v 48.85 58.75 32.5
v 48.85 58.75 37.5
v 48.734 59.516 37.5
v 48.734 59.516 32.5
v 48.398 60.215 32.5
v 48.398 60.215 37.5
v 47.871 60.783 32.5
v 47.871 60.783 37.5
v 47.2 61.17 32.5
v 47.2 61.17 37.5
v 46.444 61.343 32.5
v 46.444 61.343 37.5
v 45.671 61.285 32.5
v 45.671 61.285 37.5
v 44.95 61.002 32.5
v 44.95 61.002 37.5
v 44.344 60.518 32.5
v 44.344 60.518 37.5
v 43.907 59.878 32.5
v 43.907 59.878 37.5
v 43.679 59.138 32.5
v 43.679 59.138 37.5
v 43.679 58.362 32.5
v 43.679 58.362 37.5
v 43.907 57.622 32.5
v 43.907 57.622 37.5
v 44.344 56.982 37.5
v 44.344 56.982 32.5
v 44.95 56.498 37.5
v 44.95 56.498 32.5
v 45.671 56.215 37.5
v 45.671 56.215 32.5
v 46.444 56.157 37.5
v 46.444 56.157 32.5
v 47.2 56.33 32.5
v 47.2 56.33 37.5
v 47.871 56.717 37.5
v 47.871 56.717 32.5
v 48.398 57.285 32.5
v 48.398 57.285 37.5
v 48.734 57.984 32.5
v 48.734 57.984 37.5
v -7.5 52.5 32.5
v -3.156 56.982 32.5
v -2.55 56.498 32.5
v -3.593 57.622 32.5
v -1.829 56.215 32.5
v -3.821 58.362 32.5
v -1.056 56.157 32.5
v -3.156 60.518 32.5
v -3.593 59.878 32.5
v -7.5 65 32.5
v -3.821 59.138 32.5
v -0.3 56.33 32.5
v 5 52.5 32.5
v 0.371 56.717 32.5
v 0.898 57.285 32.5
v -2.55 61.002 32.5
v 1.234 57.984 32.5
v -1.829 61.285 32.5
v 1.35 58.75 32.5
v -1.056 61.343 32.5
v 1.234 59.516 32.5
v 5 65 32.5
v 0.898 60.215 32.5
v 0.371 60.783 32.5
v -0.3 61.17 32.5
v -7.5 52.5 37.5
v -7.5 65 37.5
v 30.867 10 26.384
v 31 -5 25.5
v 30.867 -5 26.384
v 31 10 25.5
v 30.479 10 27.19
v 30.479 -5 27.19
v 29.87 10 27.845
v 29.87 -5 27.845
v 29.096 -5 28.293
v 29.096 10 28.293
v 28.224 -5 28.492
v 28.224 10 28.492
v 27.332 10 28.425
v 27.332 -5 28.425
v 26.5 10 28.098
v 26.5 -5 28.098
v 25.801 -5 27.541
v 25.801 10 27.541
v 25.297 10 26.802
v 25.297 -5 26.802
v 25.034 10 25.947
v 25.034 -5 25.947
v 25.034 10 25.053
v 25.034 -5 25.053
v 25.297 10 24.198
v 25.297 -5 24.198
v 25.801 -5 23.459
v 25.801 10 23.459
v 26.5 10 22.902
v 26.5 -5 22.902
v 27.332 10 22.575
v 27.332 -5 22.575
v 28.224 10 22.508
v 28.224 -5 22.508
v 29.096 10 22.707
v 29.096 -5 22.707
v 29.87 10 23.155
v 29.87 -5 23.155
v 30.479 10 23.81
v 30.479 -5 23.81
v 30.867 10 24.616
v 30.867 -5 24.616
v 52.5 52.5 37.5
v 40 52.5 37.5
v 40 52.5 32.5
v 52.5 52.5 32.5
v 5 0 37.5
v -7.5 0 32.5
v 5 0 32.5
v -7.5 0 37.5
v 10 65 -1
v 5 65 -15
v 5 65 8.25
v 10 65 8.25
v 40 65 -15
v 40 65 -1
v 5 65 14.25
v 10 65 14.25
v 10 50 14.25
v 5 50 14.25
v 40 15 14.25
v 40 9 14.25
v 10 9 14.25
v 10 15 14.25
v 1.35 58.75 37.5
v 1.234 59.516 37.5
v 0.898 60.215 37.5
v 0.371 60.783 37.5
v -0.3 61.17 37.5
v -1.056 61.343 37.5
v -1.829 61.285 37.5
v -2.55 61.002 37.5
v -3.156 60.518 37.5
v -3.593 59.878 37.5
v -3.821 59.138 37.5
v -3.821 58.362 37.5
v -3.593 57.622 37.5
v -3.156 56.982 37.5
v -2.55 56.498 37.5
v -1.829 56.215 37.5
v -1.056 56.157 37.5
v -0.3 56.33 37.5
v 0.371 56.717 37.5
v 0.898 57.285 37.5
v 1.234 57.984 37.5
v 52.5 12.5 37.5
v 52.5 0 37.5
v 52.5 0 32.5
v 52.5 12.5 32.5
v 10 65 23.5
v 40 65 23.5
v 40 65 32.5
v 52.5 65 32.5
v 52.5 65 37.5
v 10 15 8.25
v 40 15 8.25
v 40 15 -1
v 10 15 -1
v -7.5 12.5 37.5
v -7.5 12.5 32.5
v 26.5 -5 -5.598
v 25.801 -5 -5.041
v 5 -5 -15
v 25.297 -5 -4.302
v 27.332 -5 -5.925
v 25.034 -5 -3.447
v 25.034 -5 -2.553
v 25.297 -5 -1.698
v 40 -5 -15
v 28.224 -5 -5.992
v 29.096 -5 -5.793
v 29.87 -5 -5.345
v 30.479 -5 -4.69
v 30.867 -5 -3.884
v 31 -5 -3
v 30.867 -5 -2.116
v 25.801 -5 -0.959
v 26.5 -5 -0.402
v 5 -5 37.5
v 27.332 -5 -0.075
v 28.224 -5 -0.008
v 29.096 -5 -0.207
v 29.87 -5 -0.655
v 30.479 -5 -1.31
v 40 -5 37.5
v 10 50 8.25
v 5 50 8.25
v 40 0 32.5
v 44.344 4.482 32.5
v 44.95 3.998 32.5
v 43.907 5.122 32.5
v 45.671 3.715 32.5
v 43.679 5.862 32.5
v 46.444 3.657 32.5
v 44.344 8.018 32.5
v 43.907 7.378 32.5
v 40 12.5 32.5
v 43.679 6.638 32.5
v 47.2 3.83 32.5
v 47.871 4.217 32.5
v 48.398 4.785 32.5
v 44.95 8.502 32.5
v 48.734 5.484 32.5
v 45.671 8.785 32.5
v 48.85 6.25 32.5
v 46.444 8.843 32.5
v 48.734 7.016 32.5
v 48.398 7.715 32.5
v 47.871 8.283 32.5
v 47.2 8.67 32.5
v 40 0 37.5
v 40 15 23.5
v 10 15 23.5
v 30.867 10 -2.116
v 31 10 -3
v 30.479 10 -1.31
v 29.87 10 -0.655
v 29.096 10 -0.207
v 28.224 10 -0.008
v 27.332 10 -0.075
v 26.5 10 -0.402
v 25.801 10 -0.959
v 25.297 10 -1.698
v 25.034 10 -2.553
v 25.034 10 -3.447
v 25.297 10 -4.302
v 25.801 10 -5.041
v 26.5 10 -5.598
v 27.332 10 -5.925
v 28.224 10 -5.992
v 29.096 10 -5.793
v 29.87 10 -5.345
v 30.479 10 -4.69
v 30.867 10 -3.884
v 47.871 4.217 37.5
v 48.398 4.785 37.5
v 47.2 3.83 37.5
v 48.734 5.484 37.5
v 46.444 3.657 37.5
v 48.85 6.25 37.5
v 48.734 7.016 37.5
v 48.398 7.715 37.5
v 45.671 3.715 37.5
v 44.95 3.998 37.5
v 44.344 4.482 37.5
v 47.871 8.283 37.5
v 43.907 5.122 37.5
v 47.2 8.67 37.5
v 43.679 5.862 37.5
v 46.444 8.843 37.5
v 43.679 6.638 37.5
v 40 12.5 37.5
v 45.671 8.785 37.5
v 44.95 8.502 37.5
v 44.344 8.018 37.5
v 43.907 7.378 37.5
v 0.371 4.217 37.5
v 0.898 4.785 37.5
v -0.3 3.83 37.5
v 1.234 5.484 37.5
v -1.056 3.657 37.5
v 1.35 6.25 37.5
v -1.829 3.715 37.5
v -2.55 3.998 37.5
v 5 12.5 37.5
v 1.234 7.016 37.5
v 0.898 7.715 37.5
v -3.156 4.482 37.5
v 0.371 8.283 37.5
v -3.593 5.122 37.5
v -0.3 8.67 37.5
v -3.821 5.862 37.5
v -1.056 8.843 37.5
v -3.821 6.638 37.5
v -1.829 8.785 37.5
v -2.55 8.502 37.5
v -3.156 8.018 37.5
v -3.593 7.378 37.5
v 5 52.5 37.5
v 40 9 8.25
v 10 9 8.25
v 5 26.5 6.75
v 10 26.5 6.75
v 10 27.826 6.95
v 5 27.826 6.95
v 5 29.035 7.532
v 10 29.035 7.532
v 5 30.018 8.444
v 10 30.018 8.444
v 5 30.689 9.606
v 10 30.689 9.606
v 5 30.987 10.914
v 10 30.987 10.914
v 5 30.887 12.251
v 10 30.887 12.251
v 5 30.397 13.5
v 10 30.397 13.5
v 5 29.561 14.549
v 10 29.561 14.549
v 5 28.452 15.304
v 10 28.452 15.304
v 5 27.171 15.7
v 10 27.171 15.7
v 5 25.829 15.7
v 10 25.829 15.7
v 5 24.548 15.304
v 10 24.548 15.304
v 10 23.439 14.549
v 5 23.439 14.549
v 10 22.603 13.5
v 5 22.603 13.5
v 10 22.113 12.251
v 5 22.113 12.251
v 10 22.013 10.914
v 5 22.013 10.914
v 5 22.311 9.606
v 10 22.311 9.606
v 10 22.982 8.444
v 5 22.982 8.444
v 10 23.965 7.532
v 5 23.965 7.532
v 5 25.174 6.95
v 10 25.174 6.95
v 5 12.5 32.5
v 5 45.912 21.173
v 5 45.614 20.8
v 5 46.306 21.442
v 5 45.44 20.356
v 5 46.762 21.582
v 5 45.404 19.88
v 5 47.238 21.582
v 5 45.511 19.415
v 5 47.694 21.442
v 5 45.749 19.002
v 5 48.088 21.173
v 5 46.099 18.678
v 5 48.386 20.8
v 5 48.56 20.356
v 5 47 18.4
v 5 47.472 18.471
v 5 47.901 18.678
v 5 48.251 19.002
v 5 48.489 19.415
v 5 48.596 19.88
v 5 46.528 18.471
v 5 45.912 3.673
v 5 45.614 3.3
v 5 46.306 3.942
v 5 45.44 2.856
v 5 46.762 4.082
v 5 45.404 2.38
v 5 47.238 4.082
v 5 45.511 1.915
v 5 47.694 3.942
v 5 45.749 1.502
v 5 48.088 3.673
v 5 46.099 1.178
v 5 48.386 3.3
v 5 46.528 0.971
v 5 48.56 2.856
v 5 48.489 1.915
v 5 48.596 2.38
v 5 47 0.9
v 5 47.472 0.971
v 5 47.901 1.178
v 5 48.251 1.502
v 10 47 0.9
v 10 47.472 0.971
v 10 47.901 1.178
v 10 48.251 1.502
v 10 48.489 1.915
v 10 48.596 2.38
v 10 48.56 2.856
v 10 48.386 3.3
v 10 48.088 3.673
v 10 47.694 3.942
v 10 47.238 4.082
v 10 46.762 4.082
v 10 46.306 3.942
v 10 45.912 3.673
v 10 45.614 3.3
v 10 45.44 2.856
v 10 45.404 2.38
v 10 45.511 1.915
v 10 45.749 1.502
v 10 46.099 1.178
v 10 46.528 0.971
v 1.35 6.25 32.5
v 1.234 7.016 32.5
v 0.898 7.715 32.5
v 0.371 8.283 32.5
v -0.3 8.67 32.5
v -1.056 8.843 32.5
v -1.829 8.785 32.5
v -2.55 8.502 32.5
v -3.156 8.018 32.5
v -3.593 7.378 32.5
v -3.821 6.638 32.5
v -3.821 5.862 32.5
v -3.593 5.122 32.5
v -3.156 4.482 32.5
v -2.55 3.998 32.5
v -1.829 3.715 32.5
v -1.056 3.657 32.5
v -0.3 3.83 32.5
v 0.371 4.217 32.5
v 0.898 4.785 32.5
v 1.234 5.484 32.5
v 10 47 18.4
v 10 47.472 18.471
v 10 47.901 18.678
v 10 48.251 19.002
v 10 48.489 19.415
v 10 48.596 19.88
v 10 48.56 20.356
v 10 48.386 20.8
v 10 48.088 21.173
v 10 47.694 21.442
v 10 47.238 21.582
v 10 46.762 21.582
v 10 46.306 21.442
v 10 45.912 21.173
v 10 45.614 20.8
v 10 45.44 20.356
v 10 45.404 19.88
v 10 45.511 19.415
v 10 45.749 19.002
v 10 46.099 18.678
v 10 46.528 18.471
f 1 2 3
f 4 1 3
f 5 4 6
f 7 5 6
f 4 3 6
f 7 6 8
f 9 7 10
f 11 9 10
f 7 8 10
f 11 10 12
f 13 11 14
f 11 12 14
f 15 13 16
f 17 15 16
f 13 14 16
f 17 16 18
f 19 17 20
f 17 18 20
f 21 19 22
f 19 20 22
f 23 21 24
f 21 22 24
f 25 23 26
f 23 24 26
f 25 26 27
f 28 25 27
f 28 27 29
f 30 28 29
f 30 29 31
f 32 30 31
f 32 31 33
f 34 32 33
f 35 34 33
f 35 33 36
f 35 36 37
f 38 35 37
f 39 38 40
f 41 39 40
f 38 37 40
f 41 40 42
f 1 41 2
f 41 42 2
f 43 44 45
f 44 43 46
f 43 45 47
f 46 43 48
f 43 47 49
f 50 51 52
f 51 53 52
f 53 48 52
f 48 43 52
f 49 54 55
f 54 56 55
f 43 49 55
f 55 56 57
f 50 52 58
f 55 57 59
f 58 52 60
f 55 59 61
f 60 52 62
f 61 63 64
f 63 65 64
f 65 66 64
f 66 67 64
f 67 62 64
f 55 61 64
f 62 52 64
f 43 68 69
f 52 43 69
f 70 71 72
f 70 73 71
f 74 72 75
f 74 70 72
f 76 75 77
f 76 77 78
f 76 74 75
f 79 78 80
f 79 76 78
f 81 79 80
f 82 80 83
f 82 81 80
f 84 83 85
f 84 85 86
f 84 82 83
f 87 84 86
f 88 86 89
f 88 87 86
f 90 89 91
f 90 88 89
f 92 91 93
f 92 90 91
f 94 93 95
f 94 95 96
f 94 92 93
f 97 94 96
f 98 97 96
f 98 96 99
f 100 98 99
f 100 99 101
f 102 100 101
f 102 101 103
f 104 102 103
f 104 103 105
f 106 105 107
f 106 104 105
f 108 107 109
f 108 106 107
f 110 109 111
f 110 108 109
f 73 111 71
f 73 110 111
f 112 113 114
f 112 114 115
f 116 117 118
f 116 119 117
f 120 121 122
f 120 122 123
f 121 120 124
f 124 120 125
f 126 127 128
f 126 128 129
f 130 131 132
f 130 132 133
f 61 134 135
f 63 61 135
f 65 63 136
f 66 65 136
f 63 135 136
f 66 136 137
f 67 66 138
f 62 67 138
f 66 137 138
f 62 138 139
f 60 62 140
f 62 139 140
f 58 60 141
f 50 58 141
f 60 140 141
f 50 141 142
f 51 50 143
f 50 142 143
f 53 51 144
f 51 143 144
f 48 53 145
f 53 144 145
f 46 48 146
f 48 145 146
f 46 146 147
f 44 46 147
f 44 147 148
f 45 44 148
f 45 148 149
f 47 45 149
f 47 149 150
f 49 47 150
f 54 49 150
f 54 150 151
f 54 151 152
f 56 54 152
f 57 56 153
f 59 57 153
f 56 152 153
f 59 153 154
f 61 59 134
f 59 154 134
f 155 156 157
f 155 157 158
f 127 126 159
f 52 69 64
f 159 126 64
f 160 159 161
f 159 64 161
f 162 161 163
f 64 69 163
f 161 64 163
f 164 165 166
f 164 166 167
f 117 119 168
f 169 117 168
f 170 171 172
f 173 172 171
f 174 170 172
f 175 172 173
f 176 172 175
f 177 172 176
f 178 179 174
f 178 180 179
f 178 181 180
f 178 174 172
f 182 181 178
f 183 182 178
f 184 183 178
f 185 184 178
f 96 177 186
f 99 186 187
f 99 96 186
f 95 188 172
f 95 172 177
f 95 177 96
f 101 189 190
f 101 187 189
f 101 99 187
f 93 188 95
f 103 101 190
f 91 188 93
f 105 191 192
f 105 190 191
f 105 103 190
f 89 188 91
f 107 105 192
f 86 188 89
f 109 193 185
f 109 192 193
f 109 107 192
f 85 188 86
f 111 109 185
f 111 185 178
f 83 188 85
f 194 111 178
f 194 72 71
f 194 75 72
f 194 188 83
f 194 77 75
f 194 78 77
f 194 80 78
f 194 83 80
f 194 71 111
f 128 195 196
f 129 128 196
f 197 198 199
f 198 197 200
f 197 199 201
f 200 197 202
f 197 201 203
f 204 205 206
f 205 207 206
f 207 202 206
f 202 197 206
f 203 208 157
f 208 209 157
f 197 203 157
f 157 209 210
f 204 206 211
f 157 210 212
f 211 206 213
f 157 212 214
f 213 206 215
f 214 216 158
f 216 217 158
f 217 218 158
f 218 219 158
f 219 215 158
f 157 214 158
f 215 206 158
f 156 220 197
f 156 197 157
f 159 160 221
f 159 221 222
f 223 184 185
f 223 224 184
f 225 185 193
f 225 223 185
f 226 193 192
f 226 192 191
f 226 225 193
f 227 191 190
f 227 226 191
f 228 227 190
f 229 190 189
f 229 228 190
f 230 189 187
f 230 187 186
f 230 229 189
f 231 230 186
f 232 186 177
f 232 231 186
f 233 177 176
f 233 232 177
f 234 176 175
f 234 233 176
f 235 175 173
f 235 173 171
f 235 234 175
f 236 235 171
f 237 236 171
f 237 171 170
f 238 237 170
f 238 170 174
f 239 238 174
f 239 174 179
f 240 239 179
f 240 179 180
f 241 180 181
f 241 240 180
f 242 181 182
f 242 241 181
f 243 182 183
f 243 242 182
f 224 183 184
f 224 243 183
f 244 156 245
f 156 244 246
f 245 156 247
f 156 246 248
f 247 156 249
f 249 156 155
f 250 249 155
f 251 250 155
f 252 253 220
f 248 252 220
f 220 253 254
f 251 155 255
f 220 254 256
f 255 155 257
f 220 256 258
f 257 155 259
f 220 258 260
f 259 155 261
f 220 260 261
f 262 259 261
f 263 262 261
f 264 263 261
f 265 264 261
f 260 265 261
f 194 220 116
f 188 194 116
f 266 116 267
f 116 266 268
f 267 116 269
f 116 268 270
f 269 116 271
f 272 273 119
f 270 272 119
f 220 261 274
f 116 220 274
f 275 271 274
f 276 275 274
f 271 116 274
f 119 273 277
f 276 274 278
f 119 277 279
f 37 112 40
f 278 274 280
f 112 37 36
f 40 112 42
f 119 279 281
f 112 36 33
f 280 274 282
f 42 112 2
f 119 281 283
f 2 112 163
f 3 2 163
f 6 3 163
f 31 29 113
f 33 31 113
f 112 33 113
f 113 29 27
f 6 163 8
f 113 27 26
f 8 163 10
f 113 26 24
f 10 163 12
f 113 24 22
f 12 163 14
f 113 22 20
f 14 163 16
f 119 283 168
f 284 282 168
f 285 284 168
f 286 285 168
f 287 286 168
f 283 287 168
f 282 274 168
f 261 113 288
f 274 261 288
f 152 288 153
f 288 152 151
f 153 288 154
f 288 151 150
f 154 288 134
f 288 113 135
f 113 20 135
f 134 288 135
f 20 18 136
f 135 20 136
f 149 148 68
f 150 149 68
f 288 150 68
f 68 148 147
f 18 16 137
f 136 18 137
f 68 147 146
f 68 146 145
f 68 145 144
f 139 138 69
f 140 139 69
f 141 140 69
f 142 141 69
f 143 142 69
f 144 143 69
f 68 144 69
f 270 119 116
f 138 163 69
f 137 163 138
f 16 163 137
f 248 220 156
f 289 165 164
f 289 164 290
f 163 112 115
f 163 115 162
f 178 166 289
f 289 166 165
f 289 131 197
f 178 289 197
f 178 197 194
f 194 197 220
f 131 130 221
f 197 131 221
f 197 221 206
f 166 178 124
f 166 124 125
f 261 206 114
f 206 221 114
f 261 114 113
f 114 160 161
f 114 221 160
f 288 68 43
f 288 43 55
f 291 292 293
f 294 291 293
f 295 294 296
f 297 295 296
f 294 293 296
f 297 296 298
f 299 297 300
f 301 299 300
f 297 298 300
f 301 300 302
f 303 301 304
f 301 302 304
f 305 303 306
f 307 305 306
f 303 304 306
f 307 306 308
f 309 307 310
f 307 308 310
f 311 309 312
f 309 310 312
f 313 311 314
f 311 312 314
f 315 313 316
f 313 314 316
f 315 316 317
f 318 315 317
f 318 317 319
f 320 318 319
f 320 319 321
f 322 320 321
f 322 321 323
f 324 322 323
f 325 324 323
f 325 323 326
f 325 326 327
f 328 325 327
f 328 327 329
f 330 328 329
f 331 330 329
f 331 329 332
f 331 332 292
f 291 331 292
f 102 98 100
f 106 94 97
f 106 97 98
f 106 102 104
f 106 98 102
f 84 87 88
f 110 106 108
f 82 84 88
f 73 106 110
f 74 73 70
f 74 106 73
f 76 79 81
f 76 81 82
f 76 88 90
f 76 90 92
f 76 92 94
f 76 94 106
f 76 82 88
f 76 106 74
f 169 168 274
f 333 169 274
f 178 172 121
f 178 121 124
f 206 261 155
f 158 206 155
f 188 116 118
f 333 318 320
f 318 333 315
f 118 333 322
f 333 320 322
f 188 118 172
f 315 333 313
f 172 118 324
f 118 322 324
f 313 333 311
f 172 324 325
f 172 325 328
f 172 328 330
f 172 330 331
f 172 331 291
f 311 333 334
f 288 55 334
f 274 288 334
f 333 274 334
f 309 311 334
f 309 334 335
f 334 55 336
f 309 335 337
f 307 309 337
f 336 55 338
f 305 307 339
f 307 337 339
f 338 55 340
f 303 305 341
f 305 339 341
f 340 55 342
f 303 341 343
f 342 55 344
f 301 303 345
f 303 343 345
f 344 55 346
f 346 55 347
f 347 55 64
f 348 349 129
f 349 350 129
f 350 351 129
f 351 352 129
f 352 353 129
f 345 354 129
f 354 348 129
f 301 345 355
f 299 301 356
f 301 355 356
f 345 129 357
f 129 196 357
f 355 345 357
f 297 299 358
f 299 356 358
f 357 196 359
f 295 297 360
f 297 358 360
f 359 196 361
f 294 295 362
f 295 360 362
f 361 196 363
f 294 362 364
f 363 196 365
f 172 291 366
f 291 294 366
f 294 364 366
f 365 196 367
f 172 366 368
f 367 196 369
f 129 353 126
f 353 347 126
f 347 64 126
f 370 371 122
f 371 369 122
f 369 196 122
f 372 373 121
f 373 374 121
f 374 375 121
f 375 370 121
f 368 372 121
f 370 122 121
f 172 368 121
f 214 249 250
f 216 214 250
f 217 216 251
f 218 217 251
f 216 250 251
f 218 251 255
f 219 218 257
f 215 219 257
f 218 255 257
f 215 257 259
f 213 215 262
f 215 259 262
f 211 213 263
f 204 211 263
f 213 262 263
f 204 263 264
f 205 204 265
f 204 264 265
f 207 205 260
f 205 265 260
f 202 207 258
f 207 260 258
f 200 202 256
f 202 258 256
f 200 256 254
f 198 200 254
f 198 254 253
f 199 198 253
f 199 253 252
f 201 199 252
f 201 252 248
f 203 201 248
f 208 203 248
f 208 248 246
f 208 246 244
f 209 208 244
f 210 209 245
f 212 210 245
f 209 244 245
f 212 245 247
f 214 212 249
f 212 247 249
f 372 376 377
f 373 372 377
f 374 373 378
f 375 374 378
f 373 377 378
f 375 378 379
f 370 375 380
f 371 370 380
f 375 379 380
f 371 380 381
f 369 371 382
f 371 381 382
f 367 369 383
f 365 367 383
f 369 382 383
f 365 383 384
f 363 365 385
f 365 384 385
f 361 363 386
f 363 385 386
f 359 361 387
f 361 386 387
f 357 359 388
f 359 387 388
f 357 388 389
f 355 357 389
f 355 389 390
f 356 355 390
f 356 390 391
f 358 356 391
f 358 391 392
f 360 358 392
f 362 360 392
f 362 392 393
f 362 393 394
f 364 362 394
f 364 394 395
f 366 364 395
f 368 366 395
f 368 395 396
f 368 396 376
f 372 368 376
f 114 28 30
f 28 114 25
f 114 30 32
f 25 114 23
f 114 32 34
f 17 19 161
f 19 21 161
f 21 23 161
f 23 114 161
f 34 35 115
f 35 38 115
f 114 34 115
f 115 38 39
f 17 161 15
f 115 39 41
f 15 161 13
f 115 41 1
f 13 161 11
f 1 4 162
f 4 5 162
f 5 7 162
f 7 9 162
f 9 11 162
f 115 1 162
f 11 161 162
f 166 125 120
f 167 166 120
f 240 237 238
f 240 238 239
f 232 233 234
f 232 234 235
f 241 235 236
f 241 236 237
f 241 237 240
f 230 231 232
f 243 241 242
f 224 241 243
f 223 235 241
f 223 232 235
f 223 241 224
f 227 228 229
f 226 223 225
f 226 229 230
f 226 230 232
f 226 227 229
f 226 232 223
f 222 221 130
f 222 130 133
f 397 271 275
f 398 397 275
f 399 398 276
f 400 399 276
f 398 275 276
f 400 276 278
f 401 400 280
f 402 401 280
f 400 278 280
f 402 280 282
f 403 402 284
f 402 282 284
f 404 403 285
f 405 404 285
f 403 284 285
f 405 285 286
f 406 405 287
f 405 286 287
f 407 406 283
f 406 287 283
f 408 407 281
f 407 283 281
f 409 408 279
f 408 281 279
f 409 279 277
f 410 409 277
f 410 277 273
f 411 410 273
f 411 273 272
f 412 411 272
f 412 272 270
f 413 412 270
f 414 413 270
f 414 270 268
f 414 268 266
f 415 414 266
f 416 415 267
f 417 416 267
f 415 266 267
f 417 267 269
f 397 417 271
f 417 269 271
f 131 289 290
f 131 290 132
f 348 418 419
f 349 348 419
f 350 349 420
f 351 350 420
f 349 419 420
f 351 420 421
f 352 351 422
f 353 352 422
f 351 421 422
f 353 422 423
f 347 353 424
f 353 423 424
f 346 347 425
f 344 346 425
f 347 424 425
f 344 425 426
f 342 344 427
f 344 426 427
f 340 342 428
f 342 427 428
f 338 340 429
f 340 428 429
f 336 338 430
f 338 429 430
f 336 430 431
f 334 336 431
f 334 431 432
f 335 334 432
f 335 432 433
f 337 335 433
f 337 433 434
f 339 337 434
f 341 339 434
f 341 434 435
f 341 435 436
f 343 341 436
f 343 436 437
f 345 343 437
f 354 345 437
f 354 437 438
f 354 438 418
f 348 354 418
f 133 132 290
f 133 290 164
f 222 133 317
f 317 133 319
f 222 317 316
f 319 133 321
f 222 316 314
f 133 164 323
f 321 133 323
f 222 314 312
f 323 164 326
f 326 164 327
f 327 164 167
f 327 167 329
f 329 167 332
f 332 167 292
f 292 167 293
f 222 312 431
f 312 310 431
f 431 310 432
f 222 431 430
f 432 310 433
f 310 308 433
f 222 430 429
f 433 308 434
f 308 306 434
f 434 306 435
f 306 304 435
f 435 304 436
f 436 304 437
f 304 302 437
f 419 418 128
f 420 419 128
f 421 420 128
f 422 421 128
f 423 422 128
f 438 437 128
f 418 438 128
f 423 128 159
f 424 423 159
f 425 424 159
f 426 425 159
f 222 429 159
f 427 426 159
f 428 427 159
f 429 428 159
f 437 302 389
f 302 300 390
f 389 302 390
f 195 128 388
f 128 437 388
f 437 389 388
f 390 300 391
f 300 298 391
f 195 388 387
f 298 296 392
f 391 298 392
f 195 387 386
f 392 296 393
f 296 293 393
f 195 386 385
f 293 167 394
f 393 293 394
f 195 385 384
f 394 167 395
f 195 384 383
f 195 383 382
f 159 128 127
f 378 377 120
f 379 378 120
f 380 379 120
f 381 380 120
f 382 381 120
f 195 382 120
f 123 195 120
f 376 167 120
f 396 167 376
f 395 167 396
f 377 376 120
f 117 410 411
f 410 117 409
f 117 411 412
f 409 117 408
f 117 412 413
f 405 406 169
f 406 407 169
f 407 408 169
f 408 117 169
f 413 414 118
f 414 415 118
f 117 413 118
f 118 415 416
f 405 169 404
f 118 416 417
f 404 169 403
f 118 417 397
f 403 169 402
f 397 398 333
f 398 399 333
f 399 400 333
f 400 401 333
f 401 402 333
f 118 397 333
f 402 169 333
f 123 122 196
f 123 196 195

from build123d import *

# Parameters (mm, degrees)
SKETCH1_W                = 40
SKETCH1_H                = 65
BOSS_EXTRUDE1_DEPTH      = 42.5
BOSS_EXTRUDE1_DEPTH_BACK = 15
SKETCH3_W                = 22.5
SKETCH3_H                = 50
CUT_EXTRUDE2_DEPTH       = 30
SKETCH4_R                = 4.5
CUT_EXTRUDE3_DEPTH       = 10
SKETCH6_W                = 40
SKETCH6_H                = 65
CUT_EXTRUDE4_DEPTH       = 5
SKETCH7_R                = 3
CUT_EXTRUDE5_DEPTH       = 10
SKETCH8_W                = 52.5
SKETCH8_H                = 65
CUT_EXTRUDE6_DEPTH       = 5
SKETCH9_W                = 12.5
SKETCH9_H                = 12.5
SKETCH9_R                = 2.6
BOSS_EXTRUDE2_DEPTH      = 5
SKETCH10_R               = 3
BOSS_EXTRUDE3_DEPTH      = 5
SKETCH11_R               = 1.6
CUT_EXTRUDE7_DEPTH       = 18.5
SKETCH12_W               = 30
SKETCH12_H               = 50
CUT_EXTRUDE8_DEPTH       = 12.25
CUT_EXTRUDE8_DEPTH_BACK  = 12.25
CUT_EXTRUDE9_DEPTH       = 30
CUT_EXTRUDE10_DEPTH      = 15


with BuildPart() as part:
    # Sketch1 → Boss-Extrude1 (new body, two sides)
    with BuildSketch(Plane.XY) as boss_extrude1_sk:
        with Locations((20, 32.5)):
            Rectangle(SKETCH1_W, SKETCH1_H)
    extrude(amount=BOSS_EXTRUDE1_DEPTH)
    extrude(boss_extrude1_sk.sketch, amount=-BOSS_EXTRUDE1_DEPTH_BACK)

    # Sketch3 → Cut-Extrude2 (cut)
    with BuildSketch(Plane(origin=(40, 0, 0), x_dir=(0, 0, -1), z_dir=(1, 0, 0))):
        with Locations((-11.25, 40)):
            Rectangle(SKETCH3_W, SKETCH3_H)
    extrude(amount=-CUT_EXTRUDE2_DEPTH, mode=Mode.SUBTRACT)

    # Sketch4 → Cut-Extrude3 (cut)
    with BuildSketch(Plane(origin=(10, 0, 0), x_dir=(0, 0, -1), z_dir=(1, 0, 0))):
        with Locations((-11.25, 26.5)):
            Circle(SKETCH4_R)
    extrude(amount=-CUT_EXTRUDE3_DEPTH, mode=Mode.SUBTRACT)

    # Sketch6 → Cut-Extrude4 (cut)
    with BuildSketch(Plane.XY.offset(42.5)):
        with Locations((20, 32.5)):
            Rectangle(SKETCH6_W, SKETCH6_H)
    extrude(amount=-CUT_EXTRUDE4_DEPTH, mode=Mode.SUBTRACT)

    # Sketch7 → Cut-Extrude5 (cut)
    with BuildSketch(Plane.XZ):
        with Locations((28, 25.5)):
            Circle(SKETCH7_R)
        with Locations((28, -3)):
            Circle(SKETCH7_R)
    extrude(amount=-CUT_EXTRUDE5_DEPTH, mode=Mode.SUBTRACT)

    # Sketch8 → Cut-Extrude6 (cut)
    with BuildSketch(Plane.ZY):
        with Locations((11.25, 32.5)):
            Rectangle(SKETCH8_W, SKETCH8_H)
    extrude(amount=-CUT_EXTRUDE6_DEPTH, mode=Mode.SUBTRACT)

    # Sketch9 → Boss-Extrude2 (add)
    with BuildSketch(Plane.XY.offset(37.5)):
        with Locations((-1.25, 58.75)):
            Rectangle(SKETCH9_W, SKETCH9_H)
        with Locations((-1.25, 58.75)):
            Circle(SKETCH9_R, mode=Mode.SUBTRACT)
        with Locations((46.25, 58.75)):
            Rectangle(SKETCH9_W, SKETCH9_H)
        with Locations((46.25, 58.75)):
            Circle(SKETCH9_R, mode=Mode.SUBTRACT)
        with Locations((46.25, 6.25)):
            Rectangle(SKETCH9_W, SKETCH9_H)
        with Locations((46.25, 6.25)):
            Circle(SKETCH9_R, mode=Mode.SUBTRACT)
        with Locations((-1.25, 6.25)):
            Rectangle(SKETCH9_W, SKETCH9_H)
        with Locations((-1.25, 6.25)):
            Circle(SKETCH9_R, mode=Mode.SUBTRACT)
    extrude(amount=-BOSS_EXTRUDE2_DEPTH)

    # Sketch10 → Boss-Extrude3 (add)
    with BuildSketch(Plane.XZ):
        Polygon((40, 32.5), (40, 37.5), (5, 37.5), (5, -15), (40, -15), align=None)
        with Locations((28, 25.5)):
            Circle(SKETCH10_R, mode=Mode.SUBTRACT)
        with Locations((28, -3)):
            Circle(SKETCH10_R, mode=Mode.SUBTRACT)
    extrude(amount=BOSS_EXTRUDE3_DEPTH)

    # Sketch11 → Cut-Extrude7 (cut, through all)
    with BuildSketch(Plane(origin=(10, 0, 0), x_dir=(0, 0, -1), z_dir=(1, 0, 0))):
        with Locations((-2.5, 47)):
            Circle(SKETCH11_R)
        with Locations((-20, 47)):
            Circle(SKETCH11_R)
    extrude(amount=-CUT_EXTRUDE7_DEPTH, mode=Mode.SUBTRACT)

    # Sketch12 → Cut-Extrude8 (cut, two sides)
    with BuildSketch(Plane(origin=(0, 0, 11.25), x_dir=(-1, 0, 0), z_dir=(0, 0, -1))) as cut_extrude8_sk:
        with Locations((-25, 40)):
            Rectangle(SKETCH12_W, SKETCH12_H)
    extrude(amount=CUT_EXTRUDE8_DEPTH, mode=Mode.SUBTRACT)
    extrude(cut_extrude8_sk.sketch, amount=-CUT_EXTRUDE8_DEPTH_BACK, mode=Mode.SUBTRACT)

    # Sketch13 → Cut-Extrude9 (cut)
    with BuildSketch(Plane(origin=(40, 0, 0), x_dir=(0, 0, -1), z_dir=(1, 0, 0))):
        Polygon((-11.25, 15), (-8.25, 15), (-8.25, 9), (-14.25, 9), (-14.25, 15), align=None)
    extrude(amount=-CUT_EXTRUDE9_DEPTH, mode=Mode.SUBTRACT)

    # Sketch14 → Cut-Extrude10 (cut)
    with BuildSketch(Plane(origin=(0, 65, 0), x_dir=(1, 0, 0), z_dir=(0, 1, 0))):
        Polygon((5, -11.25), (5, -8.25), (10, -8.25), (10, -14.25), (5, -14.25), align=None)
    extrude(amount=-CUT_EXTRUDE10_DEPTH, mode=Mode.SUBTRACT)


solid = part.part
